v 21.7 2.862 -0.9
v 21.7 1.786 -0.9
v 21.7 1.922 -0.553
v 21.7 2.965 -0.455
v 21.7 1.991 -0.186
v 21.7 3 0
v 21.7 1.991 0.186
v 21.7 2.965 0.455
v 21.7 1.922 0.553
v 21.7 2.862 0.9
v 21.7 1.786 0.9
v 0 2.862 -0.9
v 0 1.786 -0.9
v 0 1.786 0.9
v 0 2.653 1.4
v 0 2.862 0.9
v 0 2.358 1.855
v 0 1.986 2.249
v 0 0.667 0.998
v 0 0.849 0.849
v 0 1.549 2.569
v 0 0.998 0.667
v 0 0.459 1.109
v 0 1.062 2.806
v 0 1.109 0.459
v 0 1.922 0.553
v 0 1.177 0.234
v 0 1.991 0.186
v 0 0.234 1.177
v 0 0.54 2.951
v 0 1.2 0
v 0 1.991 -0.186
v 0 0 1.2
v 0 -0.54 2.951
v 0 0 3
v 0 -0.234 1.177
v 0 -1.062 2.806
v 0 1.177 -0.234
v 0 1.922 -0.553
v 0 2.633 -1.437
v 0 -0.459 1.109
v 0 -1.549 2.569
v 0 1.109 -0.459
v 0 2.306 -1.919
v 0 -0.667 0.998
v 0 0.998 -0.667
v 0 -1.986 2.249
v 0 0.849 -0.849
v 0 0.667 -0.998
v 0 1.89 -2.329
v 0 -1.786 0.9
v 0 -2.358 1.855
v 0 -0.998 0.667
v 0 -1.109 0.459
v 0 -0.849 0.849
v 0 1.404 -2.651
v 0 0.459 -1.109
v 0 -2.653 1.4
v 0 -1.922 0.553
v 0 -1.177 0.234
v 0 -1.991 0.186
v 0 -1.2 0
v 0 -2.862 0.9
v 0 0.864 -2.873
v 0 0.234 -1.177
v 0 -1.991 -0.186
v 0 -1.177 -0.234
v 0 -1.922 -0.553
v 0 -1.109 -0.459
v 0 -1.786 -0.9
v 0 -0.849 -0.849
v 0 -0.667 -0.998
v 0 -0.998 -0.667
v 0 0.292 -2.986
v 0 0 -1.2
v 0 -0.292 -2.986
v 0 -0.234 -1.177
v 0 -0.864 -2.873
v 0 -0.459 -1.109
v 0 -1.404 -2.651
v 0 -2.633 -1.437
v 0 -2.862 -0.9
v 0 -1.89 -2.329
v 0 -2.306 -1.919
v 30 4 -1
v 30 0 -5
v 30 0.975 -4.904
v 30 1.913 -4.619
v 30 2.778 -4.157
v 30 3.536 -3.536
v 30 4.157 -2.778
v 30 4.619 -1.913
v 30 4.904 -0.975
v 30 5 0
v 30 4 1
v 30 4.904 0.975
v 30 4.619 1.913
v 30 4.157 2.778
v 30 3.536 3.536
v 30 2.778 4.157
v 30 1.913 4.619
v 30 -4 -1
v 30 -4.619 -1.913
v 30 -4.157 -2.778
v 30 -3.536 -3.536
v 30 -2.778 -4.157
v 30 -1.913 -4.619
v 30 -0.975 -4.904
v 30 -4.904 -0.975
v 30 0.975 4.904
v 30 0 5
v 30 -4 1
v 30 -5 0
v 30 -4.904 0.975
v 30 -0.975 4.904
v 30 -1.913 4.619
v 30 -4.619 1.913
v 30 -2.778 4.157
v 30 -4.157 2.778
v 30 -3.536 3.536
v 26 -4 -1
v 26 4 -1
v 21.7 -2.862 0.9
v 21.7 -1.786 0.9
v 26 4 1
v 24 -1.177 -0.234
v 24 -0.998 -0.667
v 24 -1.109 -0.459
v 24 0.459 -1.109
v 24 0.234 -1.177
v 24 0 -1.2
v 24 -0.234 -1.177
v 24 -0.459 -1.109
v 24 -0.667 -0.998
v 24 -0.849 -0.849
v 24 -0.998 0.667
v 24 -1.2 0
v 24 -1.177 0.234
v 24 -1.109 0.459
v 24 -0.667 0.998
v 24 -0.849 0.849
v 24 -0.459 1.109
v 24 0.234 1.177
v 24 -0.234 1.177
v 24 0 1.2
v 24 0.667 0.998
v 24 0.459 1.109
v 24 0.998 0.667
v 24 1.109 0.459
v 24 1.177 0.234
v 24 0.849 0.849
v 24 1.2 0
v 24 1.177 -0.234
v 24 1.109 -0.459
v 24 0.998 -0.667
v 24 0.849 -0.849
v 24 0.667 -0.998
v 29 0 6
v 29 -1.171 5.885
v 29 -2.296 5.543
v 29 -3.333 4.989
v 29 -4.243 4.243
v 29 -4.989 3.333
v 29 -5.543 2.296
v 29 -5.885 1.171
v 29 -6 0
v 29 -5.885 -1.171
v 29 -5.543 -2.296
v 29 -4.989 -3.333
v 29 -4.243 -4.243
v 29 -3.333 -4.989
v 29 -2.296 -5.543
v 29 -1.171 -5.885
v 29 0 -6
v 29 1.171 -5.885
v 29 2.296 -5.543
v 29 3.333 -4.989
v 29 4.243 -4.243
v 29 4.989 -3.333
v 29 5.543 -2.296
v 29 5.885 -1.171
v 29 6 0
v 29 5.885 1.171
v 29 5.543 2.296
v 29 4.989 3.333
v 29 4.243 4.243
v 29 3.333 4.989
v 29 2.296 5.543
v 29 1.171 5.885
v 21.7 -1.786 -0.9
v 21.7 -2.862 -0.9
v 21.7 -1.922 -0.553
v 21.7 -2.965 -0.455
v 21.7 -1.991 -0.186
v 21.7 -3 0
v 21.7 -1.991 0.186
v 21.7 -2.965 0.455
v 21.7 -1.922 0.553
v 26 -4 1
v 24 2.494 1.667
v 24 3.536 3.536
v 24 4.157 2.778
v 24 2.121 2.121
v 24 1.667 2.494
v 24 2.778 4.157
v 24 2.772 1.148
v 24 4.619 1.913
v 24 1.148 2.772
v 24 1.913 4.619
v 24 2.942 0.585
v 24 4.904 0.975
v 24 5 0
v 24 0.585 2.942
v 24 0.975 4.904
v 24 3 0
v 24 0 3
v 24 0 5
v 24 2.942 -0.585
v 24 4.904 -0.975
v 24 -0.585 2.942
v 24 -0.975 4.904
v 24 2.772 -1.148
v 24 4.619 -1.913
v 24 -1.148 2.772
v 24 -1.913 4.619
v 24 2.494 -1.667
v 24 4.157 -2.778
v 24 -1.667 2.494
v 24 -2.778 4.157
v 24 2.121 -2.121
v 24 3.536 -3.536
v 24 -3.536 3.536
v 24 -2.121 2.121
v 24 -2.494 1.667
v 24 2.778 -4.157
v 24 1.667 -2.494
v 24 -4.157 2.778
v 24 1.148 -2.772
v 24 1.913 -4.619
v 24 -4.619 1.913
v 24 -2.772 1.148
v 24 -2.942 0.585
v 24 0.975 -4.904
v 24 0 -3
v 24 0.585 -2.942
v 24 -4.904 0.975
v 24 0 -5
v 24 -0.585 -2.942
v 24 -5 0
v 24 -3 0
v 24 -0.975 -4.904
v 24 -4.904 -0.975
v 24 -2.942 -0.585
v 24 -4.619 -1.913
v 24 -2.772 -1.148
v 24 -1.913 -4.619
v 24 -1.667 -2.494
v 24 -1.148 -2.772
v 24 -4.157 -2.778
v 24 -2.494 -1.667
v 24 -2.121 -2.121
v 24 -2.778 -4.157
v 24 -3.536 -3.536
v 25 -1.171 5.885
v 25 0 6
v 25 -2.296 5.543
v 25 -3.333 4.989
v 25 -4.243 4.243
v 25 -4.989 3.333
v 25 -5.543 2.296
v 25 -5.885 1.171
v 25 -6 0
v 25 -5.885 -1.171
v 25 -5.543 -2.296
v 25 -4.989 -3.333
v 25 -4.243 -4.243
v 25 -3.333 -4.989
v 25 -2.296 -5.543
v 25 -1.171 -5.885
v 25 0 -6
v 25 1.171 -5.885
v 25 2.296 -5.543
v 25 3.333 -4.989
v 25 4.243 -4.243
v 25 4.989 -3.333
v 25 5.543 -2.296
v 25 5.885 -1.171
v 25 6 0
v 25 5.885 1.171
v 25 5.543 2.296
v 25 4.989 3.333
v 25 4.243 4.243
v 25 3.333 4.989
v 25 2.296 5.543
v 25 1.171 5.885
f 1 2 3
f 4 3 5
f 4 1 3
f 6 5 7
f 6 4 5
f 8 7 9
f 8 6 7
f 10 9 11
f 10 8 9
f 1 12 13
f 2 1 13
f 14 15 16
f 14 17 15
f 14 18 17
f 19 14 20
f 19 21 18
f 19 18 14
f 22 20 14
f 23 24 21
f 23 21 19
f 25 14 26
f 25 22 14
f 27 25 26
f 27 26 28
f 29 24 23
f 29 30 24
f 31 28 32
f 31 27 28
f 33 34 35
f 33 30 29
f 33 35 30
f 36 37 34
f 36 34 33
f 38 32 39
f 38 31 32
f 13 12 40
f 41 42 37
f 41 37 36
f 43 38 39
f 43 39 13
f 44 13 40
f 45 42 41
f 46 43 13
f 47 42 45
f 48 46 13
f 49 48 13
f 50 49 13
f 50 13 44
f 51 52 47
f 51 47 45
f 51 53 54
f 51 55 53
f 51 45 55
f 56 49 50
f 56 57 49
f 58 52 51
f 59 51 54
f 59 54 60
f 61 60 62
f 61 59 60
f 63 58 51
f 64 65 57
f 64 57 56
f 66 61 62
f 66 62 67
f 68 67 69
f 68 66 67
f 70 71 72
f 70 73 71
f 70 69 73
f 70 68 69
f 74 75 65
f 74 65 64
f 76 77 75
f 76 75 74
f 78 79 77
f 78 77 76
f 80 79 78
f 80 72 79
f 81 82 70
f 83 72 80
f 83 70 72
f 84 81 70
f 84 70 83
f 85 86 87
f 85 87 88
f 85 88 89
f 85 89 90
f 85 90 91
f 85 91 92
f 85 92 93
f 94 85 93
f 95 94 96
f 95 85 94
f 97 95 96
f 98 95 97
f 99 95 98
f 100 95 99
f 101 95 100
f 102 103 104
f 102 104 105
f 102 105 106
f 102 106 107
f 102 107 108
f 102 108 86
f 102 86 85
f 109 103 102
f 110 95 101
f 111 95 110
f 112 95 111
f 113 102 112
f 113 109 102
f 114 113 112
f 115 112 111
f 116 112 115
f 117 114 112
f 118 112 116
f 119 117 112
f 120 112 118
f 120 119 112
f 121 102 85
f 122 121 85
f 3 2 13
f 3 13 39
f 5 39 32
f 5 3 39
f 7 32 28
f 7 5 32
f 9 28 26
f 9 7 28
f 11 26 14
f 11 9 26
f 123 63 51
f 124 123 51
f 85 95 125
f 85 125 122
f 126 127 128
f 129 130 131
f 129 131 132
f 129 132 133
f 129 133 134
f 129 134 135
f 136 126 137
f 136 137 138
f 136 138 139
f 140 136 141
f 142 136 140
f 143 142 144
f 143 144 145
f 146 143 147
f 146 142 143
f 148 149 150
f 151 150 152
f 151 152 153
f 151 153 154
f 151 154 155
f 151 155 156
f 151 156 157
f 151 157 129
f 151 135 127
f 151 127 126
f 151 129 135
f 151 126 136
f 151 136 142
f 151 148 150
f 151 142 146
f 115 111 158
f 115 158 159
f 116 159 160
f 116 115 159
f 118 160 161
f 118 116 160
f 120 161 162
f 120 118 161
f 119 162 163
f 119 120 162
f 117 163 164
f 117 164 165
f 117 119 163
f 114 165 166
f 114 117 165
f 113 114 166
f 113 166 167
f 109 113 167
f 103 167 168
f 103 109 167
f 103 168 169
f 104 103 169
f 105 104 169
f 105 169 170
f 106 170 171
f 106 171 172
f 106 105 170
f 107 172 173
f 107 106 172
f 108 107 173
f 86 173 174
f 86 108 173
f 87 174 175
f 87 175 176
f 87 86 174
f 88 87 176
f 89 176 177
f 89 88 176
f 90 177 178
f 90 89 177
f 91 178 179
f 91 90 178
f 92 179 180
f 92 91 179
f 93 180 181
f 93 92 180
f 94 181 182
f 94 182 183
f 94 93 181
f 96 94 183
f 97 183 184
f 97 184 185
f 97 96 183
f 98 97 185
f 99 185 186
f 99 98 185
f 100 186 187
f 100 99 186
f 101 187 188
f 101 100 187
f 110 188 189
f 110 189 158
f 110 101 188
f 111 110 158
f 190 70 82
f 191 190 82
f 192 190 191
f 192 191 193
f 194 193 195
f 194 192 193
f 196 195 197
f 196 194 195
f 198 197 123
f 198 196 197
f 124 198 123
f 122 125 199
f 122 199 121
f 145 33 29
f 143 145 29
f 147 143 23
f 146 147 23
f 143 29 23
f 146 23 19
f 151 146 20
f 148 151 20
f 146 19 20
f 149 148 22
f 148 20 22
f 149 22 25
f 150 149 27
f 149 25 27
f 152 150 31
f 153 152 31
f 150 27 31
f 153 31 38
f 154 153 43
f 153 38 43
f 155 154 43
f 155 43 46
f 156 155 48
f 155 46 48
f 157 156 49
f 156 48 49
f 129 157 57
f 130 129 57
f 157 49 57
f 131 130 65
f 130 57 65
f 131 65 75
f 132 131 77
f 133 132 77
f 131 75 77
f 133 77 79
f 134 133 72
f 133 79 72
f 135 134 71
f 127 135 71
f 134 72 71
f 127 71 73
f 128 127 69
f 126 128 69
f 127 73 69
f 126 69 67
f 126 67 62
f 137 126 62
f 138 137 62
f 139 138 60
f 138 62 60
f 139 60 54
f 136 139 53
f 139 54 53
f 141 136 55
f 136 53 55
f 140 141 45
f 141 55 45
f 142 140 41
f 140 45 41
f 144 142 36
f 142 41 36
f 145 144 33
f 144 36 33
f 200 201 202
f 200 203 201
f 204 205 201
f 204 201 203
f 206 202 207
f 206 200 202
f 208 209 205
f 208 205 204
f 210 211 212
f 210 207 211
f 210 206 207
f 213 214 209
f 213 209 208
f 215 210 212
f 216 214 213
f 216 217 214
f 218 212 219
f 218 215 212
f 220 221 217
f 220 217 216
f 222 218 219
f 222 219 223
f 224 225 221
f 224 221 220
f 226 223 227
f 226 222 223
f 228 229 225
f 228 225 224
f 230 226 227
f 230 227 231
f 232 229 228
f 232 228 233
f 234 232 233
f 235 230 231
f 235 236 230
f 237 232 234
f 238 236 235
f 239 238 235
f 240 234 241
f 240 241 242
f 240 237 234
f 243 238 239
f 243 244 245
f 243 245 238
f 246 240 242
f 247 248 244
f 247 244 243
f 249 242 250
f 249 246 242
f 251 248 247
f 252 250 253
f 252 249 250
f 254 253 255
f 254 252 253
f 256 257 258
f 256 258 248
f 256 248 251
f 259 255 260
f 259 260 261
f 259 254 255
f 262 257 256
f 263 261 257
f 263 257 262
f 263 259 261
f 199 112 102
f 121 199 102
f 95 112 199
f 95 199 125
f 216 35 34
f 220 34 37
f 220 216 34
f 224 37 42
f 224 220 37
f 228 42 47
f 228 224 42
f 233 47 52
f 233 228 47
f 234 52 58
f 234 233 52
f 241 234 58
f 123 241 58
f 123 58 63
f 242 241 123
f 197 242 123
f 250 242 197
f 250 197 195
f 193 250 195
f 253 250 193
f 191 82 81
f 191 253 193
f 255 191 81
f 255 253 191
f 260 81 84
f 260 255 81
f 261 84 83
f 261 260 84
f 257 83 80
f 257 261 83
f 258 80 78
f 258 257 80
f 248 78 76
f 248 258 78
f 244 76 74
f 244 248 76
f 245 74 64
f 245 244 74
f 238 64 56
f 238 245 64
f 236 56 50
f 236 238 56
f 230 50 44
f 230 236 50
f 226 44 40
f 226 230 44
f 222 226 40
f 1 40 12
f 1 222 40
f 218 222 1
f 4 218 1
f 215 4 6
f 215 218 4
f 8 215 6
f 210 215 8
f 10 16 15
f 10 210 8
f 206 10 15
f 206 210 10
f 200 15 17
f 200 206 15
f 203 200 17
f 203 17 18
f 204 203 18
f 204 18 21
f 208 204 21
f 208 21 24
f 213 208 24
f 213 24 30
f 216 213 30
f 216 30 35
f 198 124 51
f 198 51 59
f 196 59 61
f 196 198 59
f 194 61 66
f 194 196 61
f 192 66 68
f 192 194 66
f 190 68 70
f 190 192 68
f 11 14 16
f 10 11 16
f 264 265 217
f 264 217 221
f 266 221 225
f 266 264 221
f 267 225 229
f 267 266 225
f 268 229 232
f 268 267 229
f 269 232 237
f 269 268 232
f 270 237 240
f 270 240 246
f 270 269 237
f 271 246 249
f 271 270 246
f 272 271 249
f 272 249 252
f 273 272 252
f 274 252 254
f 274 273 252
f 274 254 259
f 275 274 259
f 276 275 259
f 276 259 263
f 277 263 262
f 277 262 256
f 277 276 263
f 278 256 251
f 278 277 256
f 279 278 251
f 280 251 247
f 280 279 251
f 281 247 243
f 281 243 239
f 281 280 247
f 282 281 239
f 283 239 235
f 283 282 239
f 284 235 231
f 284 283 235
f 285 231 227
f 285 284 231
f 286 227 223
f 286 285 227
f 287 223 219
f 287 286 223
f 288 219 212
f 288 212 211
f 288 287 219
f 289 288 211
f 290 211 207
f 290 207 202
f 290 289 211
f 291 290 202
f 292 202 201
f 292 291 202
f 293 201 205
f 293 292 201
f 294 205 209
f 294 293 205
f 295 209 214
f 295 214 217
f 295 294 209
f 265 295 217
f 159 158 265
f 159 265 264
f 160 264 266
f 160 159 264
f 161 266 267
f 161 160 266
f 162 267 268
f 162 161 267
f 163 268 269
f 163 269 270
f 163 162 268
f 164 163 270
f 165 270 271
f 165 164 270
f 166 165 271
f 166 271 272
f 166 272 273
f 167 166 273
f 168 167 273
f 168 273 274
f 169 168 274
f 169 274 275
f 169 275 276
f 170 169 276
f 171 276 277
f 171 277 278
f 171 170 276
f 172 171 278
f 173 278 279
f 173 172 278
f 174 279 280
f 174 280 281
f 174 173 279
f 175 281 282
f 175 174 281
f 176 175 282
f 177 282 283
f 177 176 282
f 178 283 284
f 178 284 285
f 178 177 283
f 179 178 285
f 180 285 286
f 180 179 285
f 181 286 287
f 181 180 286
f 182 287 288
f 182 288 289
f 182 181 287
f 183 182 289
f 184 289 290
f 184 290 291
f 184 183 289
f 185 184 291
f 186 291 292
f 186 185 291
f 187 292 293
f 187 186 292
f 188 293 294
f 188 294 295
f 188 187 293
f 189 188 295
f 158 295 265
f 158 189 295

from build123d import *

# Parameters (mm, degrees)
SKETCH3_R          = 1.2
CUT_EXTRUDE1_DEPTH = 24
SKETCH4_W          = 2
SKETCH4_H          = 8
CUT_EXTRUDE2_DEPTH = 4
CHAMFER1_SIZE      = 1
CUT_EXTRUDE3_START = -21.7
CUT_EXTRUDE3_DEPTH = 21.7


with BuildPart() as part:
    # Sketch2 → Revolve1 (revolve)
    with BuildSketch(Plane(origin=(0, 0, 0), x_dir=(1, 0, 0), z_dir=(0, 1, 0)), mode=Mode.PRIVATE) as revolve1_sk:
        Polygon((0, 0), (0, 3), (24, 3), (24, 6), (30, 6), (30, 0), align=None)
    revolve(revolve1_sk.sketch.rotate(Axis((0, 0, 0), (1, 0, 0)), 180), axis=Axis((0, 0, 0), (1, 0, 0)))

    # Sketch3 → Cut-Extrude1 (cut)
    with BuildSketch(Plane.ZY):
        Circle(SKETCH3_R)
    extrude(amount=-CUT_EXTRUDE1_DEPTH, mode=Mode.SUBTRACT)

    # Sketch4 → Cut-Extrude2 (cut)
    with BuildSketch(Plane(origin=(30, 0, 0), x_dir=(0, 0, -1), z_dir=(1, 0, 0))):
        Rectangle(SKETCH4_W, SKETCH4_H)
    extrude(amount=-CUT_EXTRUDE2_DEPTH, mode=Mode.SUBTRACT)

    # Chamfer1
    chamfer1_edges = [part.edges().sort_by_distance(p)[0] for p in [
        (30, 0, -6),
        (24, 0, -6),
    ]]
    chamfer(chamfer1_edges, length=CHAMFER1_SIZE)

    # Sketch5 → Cut-Extrude3 (cut)
    with BuildSketch(Plane.ZY.offset(CUT_EXTRUDE3_START)):
        with BuildLine():
            Line((-0.9, 2.861817604), (-0.9, 1.78605711))
            ThreePointArc((-0.9, 1.78605711), (0, 2), (0.9, 1.78605711))
            Line((0.9, 1.78605711), (0.9, 2.861817604))
            ThreePointArc((0.9, 2.861817604), (0, 3), (-0.9, 2.861817604))
        make_face()
        with BuildLine():
            Line((-0.9, -1.78605711), (-0.9, -2.861817604))
            ThreePointArc((-0.9, -2.861817604), (0, -3), (0.9, -2.861817604))
            Line((0.9, -2.861817604), (0.9, -1.78605711))
            ThreePointArc((0.9, -1.78605711), (0, -2), (-0.9, -1.78605711))
        make_face()
    extrude(amount=CUT_EXTRUDE3_DEPTH, mode=Mode.SUBTRACT)


solid = part.part
